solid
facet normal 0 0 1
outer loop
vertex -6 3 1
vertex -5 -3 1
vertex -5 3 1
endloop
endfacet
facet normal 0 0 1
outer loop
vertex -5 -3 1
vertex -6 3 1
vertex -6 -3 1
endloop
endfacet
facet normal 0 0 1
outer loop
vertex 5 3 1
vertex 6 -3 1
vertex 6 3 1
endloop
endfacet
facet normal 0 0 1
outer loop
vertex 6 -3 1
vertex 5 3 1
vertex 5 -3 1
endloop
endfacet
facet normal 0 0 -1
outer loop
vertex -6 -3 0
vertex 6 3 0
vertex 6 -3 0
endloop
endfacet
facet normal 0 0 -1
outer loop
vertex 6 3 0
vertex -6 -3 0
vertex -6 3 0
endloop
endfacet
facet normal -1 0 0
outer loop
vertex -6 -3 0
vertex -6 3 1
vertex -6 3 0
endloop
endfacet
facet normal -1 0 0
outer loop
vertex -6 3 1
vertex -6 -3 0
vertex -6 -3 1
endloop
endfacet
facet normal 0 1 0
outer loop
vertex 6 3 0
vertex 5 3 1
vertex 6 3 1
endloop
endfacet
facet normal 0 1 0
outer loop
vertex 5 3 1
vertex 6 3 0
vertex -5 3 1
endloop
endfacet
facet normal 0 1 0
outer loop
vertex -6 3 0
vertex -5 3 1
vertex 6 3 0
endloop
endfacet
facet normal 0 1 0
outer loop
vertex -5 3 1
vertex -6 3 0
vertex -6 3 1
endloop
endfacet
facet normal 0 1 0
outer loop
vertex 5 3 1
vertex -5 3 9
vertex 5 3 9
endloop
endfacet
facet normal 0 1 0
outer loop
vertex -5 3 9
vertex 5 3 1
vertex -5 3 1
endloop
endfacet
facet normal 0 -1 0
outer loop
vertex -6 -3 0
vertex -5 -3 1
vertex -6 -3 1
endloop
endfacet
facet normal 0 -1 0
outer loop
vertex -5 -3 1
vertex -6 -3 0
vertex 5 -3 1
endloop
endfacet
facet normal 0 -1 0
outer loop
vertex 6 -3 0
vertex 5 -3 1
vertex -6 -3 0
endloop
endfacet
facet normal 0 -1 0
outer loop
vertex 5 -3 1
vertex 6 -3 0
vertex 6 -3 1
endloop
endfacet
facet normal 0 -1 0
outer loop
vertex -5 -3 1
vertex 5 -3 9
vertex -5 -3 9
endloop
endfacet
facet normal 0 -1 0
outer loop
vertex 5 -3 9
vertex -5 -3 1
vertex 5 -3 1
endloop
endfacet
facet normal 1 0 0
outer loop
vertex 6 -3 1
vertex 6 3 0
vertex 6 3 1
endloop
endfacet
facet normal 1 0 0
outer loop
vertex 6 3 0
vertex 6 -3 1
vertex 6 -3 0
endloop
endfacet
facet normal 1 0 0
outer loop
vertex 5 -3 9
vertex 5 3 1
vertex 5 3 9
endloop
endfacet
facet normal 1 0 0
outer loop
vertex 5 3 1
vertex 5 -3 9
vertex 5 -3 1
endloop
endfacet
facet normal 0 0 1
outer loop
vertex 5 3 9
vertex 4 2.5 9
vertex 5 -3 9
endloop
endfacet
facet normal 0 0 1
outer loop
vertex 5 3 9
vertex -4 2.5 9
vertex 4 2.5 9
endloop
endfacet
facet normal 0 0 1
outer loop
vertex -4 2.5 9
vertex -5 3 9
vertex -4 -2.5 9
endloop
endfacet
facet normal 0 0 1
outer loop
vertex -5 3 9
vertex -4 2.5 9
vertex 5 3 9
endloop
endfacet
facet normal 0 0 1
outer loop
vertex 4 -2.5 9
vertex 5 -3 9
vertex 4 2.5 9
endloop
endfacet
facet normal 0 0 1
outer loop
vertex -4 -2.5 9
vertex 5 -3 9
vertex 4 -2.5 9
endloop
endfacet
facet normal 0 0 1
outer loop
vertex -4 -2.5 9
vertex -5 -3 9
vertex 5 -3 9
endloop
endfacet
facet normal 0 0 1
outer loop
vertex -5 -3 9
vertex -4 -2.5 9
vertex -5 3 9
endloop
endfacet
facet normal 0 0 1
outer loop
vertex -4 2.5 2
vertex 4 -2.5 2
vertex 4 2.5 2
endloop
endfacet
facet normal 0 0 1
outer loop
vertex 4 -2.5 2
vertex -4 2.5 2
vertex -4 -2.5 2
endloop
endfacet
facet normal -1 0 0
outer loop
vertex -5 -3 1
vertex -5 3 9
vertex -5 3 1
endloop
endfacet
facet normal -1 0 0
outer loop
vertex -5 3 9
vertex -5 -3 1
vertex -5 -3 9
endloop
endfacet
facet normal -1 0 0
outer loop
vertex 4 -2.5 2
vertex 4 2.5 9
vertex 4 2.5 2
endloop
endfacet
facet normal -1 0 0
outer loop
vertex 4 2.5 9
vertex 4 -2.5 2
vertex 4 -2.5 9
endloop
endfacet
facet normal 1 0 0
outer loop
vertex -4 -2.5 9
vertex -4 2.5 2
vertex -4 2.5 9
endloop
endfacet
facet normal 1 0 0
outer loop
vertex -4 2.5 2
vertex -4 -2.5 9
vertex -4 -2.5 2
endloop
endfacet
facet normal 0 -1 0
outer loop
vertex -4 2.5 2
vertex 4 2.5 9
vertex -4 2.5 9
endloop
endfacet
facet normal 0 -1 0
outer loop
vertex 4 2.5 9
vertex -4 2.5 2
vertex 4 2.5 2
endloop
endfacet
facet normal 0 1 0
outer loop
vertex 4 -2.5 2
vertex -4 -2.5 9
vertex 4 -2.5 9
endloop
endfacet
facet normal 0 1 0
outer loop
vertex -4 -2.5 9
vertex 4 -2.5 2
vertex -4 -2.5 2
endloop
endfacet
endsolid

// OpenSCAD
// ============================================================
// 캡스톤 프로젝트 - 하우징 (완전히 새 디자인)
// 단위: 전부 cm
//
// 직육면체(몸통): 가로(X) 10cm x 세로(Y) 6cm x 높이(Z) 7cm, 벽 두께 1cm의 빈 상자.
//   바닥면(판재1이 붙는 면, world Z 아래쪽)에 8cm x 5cm 직사각형 구멍을 정중앙에 뚫음,
//   높이 7cm 전체를 관통해 윗면까지 이어짐.
// 판재1: 10cm x 6cm 직사각형, 두께 1cm. 직육면체 바로 아래, 같은 footprint로 맞닿음.
// 판재2, 3: 6cm x 6cm 정사각형 2개, 두께 1cm. 판재1 아래에 나란히(X축 방향) 배치.
//
// * 정사각형 2개 사이 간격은 아직 정확한 값을 받지 못해 0(맞닿음)으로 가정했습니다.
//   실제 원하시는 배치와 다를 수 있어 확인 후 조정하겠습니다.
// ============================================================

module capstone() {
    // 직육면체(몸통)
    body_w = 10;   // 가로(X)
    body_d = 6;    // 세로(Y)
    body_h = 7;    // 높이(Z)
    wall_t = 1;    // 벽 두께

    // 판재1
    plate1_w = 10;
    plate1_d = 6;
    plate1_t = 1;

    // 판재2, 3 (정사각형, 나란히)
    sq_size = 6;
    sq_t    = 1;
    sq_gap  = 0; // TODO: 두 정사각형 사이 간격 미확정 (일단 0, 맞닿음으로 가정)

    // 구멍 (직육면체 바닥면, 정중앙, 높이 전체 관통)
    hole_w = 8;
    hole_d = 5;

    // --- Z 스택 (아래 -> 위) ---
    sq_z0     = 0;
    sq_z1     = sq_z0 + sq_t;          // 1
    plate1_z0 = sq_z1;                 // 1
    plate1_z1 = plate1_z0 + plate1_t;  // 2
    body_z0   = plate1_z1;             // 2
    body_z1   = body_z0 + body_h;      // 9

    echo("[Capstone] total height =", body_z1, " (sq_t+plate1_t+body_h)");

    // 정사각형 2개 (나란히, X축 방향)
    sq_total_w = sq_size * 2 + sq_gap;
    color("SteelBlue") {
        translate([-sq_total_w / 2, -sq_size / 2, sq_z0])
            cube([sq_size, sq_size, sq_t]);
        translate([-sq_total_w / 2 + sq_size + sq_gap, -sq_size / 2, sq_z0])
            cube([sq_size, sq_size, sq_t]);
    }

    // 판재1
    color("SteelBlue")
        translate([-plate1_w / 2, -plate1_d / 2, plate1_z0])
            cube([plate1_w, plate1_d, plate1_t]);

    // 직육면체 몸통 (속이 빈 상자, 벽 두께 wall_t) + 8x5 구멍 (높이 전체 관통)
    inner_w = body_w - 2 * wall_t;
    inner_d = body_d - 2 * wall_t;
    inner_h = body_h - 2 * wall_t;

    difference() {
        color("gray")
            difference() {
                translate([-body_w / 2, -body_d / 2, body_z0])
                    cube([body_w, body_d, body_h]);
                translate([-inner_w / 2, -inner_d / 2, body_z0 + wall_t])
                    cube([inner_w, inner_d, inner_h]);
            }
        translate([-hole_w / 2, -hole_d / 2, body_z0 - 0.1])
            cube([hole_w, hole_d, body_h + 0.2]);
    }
}

capstone();
